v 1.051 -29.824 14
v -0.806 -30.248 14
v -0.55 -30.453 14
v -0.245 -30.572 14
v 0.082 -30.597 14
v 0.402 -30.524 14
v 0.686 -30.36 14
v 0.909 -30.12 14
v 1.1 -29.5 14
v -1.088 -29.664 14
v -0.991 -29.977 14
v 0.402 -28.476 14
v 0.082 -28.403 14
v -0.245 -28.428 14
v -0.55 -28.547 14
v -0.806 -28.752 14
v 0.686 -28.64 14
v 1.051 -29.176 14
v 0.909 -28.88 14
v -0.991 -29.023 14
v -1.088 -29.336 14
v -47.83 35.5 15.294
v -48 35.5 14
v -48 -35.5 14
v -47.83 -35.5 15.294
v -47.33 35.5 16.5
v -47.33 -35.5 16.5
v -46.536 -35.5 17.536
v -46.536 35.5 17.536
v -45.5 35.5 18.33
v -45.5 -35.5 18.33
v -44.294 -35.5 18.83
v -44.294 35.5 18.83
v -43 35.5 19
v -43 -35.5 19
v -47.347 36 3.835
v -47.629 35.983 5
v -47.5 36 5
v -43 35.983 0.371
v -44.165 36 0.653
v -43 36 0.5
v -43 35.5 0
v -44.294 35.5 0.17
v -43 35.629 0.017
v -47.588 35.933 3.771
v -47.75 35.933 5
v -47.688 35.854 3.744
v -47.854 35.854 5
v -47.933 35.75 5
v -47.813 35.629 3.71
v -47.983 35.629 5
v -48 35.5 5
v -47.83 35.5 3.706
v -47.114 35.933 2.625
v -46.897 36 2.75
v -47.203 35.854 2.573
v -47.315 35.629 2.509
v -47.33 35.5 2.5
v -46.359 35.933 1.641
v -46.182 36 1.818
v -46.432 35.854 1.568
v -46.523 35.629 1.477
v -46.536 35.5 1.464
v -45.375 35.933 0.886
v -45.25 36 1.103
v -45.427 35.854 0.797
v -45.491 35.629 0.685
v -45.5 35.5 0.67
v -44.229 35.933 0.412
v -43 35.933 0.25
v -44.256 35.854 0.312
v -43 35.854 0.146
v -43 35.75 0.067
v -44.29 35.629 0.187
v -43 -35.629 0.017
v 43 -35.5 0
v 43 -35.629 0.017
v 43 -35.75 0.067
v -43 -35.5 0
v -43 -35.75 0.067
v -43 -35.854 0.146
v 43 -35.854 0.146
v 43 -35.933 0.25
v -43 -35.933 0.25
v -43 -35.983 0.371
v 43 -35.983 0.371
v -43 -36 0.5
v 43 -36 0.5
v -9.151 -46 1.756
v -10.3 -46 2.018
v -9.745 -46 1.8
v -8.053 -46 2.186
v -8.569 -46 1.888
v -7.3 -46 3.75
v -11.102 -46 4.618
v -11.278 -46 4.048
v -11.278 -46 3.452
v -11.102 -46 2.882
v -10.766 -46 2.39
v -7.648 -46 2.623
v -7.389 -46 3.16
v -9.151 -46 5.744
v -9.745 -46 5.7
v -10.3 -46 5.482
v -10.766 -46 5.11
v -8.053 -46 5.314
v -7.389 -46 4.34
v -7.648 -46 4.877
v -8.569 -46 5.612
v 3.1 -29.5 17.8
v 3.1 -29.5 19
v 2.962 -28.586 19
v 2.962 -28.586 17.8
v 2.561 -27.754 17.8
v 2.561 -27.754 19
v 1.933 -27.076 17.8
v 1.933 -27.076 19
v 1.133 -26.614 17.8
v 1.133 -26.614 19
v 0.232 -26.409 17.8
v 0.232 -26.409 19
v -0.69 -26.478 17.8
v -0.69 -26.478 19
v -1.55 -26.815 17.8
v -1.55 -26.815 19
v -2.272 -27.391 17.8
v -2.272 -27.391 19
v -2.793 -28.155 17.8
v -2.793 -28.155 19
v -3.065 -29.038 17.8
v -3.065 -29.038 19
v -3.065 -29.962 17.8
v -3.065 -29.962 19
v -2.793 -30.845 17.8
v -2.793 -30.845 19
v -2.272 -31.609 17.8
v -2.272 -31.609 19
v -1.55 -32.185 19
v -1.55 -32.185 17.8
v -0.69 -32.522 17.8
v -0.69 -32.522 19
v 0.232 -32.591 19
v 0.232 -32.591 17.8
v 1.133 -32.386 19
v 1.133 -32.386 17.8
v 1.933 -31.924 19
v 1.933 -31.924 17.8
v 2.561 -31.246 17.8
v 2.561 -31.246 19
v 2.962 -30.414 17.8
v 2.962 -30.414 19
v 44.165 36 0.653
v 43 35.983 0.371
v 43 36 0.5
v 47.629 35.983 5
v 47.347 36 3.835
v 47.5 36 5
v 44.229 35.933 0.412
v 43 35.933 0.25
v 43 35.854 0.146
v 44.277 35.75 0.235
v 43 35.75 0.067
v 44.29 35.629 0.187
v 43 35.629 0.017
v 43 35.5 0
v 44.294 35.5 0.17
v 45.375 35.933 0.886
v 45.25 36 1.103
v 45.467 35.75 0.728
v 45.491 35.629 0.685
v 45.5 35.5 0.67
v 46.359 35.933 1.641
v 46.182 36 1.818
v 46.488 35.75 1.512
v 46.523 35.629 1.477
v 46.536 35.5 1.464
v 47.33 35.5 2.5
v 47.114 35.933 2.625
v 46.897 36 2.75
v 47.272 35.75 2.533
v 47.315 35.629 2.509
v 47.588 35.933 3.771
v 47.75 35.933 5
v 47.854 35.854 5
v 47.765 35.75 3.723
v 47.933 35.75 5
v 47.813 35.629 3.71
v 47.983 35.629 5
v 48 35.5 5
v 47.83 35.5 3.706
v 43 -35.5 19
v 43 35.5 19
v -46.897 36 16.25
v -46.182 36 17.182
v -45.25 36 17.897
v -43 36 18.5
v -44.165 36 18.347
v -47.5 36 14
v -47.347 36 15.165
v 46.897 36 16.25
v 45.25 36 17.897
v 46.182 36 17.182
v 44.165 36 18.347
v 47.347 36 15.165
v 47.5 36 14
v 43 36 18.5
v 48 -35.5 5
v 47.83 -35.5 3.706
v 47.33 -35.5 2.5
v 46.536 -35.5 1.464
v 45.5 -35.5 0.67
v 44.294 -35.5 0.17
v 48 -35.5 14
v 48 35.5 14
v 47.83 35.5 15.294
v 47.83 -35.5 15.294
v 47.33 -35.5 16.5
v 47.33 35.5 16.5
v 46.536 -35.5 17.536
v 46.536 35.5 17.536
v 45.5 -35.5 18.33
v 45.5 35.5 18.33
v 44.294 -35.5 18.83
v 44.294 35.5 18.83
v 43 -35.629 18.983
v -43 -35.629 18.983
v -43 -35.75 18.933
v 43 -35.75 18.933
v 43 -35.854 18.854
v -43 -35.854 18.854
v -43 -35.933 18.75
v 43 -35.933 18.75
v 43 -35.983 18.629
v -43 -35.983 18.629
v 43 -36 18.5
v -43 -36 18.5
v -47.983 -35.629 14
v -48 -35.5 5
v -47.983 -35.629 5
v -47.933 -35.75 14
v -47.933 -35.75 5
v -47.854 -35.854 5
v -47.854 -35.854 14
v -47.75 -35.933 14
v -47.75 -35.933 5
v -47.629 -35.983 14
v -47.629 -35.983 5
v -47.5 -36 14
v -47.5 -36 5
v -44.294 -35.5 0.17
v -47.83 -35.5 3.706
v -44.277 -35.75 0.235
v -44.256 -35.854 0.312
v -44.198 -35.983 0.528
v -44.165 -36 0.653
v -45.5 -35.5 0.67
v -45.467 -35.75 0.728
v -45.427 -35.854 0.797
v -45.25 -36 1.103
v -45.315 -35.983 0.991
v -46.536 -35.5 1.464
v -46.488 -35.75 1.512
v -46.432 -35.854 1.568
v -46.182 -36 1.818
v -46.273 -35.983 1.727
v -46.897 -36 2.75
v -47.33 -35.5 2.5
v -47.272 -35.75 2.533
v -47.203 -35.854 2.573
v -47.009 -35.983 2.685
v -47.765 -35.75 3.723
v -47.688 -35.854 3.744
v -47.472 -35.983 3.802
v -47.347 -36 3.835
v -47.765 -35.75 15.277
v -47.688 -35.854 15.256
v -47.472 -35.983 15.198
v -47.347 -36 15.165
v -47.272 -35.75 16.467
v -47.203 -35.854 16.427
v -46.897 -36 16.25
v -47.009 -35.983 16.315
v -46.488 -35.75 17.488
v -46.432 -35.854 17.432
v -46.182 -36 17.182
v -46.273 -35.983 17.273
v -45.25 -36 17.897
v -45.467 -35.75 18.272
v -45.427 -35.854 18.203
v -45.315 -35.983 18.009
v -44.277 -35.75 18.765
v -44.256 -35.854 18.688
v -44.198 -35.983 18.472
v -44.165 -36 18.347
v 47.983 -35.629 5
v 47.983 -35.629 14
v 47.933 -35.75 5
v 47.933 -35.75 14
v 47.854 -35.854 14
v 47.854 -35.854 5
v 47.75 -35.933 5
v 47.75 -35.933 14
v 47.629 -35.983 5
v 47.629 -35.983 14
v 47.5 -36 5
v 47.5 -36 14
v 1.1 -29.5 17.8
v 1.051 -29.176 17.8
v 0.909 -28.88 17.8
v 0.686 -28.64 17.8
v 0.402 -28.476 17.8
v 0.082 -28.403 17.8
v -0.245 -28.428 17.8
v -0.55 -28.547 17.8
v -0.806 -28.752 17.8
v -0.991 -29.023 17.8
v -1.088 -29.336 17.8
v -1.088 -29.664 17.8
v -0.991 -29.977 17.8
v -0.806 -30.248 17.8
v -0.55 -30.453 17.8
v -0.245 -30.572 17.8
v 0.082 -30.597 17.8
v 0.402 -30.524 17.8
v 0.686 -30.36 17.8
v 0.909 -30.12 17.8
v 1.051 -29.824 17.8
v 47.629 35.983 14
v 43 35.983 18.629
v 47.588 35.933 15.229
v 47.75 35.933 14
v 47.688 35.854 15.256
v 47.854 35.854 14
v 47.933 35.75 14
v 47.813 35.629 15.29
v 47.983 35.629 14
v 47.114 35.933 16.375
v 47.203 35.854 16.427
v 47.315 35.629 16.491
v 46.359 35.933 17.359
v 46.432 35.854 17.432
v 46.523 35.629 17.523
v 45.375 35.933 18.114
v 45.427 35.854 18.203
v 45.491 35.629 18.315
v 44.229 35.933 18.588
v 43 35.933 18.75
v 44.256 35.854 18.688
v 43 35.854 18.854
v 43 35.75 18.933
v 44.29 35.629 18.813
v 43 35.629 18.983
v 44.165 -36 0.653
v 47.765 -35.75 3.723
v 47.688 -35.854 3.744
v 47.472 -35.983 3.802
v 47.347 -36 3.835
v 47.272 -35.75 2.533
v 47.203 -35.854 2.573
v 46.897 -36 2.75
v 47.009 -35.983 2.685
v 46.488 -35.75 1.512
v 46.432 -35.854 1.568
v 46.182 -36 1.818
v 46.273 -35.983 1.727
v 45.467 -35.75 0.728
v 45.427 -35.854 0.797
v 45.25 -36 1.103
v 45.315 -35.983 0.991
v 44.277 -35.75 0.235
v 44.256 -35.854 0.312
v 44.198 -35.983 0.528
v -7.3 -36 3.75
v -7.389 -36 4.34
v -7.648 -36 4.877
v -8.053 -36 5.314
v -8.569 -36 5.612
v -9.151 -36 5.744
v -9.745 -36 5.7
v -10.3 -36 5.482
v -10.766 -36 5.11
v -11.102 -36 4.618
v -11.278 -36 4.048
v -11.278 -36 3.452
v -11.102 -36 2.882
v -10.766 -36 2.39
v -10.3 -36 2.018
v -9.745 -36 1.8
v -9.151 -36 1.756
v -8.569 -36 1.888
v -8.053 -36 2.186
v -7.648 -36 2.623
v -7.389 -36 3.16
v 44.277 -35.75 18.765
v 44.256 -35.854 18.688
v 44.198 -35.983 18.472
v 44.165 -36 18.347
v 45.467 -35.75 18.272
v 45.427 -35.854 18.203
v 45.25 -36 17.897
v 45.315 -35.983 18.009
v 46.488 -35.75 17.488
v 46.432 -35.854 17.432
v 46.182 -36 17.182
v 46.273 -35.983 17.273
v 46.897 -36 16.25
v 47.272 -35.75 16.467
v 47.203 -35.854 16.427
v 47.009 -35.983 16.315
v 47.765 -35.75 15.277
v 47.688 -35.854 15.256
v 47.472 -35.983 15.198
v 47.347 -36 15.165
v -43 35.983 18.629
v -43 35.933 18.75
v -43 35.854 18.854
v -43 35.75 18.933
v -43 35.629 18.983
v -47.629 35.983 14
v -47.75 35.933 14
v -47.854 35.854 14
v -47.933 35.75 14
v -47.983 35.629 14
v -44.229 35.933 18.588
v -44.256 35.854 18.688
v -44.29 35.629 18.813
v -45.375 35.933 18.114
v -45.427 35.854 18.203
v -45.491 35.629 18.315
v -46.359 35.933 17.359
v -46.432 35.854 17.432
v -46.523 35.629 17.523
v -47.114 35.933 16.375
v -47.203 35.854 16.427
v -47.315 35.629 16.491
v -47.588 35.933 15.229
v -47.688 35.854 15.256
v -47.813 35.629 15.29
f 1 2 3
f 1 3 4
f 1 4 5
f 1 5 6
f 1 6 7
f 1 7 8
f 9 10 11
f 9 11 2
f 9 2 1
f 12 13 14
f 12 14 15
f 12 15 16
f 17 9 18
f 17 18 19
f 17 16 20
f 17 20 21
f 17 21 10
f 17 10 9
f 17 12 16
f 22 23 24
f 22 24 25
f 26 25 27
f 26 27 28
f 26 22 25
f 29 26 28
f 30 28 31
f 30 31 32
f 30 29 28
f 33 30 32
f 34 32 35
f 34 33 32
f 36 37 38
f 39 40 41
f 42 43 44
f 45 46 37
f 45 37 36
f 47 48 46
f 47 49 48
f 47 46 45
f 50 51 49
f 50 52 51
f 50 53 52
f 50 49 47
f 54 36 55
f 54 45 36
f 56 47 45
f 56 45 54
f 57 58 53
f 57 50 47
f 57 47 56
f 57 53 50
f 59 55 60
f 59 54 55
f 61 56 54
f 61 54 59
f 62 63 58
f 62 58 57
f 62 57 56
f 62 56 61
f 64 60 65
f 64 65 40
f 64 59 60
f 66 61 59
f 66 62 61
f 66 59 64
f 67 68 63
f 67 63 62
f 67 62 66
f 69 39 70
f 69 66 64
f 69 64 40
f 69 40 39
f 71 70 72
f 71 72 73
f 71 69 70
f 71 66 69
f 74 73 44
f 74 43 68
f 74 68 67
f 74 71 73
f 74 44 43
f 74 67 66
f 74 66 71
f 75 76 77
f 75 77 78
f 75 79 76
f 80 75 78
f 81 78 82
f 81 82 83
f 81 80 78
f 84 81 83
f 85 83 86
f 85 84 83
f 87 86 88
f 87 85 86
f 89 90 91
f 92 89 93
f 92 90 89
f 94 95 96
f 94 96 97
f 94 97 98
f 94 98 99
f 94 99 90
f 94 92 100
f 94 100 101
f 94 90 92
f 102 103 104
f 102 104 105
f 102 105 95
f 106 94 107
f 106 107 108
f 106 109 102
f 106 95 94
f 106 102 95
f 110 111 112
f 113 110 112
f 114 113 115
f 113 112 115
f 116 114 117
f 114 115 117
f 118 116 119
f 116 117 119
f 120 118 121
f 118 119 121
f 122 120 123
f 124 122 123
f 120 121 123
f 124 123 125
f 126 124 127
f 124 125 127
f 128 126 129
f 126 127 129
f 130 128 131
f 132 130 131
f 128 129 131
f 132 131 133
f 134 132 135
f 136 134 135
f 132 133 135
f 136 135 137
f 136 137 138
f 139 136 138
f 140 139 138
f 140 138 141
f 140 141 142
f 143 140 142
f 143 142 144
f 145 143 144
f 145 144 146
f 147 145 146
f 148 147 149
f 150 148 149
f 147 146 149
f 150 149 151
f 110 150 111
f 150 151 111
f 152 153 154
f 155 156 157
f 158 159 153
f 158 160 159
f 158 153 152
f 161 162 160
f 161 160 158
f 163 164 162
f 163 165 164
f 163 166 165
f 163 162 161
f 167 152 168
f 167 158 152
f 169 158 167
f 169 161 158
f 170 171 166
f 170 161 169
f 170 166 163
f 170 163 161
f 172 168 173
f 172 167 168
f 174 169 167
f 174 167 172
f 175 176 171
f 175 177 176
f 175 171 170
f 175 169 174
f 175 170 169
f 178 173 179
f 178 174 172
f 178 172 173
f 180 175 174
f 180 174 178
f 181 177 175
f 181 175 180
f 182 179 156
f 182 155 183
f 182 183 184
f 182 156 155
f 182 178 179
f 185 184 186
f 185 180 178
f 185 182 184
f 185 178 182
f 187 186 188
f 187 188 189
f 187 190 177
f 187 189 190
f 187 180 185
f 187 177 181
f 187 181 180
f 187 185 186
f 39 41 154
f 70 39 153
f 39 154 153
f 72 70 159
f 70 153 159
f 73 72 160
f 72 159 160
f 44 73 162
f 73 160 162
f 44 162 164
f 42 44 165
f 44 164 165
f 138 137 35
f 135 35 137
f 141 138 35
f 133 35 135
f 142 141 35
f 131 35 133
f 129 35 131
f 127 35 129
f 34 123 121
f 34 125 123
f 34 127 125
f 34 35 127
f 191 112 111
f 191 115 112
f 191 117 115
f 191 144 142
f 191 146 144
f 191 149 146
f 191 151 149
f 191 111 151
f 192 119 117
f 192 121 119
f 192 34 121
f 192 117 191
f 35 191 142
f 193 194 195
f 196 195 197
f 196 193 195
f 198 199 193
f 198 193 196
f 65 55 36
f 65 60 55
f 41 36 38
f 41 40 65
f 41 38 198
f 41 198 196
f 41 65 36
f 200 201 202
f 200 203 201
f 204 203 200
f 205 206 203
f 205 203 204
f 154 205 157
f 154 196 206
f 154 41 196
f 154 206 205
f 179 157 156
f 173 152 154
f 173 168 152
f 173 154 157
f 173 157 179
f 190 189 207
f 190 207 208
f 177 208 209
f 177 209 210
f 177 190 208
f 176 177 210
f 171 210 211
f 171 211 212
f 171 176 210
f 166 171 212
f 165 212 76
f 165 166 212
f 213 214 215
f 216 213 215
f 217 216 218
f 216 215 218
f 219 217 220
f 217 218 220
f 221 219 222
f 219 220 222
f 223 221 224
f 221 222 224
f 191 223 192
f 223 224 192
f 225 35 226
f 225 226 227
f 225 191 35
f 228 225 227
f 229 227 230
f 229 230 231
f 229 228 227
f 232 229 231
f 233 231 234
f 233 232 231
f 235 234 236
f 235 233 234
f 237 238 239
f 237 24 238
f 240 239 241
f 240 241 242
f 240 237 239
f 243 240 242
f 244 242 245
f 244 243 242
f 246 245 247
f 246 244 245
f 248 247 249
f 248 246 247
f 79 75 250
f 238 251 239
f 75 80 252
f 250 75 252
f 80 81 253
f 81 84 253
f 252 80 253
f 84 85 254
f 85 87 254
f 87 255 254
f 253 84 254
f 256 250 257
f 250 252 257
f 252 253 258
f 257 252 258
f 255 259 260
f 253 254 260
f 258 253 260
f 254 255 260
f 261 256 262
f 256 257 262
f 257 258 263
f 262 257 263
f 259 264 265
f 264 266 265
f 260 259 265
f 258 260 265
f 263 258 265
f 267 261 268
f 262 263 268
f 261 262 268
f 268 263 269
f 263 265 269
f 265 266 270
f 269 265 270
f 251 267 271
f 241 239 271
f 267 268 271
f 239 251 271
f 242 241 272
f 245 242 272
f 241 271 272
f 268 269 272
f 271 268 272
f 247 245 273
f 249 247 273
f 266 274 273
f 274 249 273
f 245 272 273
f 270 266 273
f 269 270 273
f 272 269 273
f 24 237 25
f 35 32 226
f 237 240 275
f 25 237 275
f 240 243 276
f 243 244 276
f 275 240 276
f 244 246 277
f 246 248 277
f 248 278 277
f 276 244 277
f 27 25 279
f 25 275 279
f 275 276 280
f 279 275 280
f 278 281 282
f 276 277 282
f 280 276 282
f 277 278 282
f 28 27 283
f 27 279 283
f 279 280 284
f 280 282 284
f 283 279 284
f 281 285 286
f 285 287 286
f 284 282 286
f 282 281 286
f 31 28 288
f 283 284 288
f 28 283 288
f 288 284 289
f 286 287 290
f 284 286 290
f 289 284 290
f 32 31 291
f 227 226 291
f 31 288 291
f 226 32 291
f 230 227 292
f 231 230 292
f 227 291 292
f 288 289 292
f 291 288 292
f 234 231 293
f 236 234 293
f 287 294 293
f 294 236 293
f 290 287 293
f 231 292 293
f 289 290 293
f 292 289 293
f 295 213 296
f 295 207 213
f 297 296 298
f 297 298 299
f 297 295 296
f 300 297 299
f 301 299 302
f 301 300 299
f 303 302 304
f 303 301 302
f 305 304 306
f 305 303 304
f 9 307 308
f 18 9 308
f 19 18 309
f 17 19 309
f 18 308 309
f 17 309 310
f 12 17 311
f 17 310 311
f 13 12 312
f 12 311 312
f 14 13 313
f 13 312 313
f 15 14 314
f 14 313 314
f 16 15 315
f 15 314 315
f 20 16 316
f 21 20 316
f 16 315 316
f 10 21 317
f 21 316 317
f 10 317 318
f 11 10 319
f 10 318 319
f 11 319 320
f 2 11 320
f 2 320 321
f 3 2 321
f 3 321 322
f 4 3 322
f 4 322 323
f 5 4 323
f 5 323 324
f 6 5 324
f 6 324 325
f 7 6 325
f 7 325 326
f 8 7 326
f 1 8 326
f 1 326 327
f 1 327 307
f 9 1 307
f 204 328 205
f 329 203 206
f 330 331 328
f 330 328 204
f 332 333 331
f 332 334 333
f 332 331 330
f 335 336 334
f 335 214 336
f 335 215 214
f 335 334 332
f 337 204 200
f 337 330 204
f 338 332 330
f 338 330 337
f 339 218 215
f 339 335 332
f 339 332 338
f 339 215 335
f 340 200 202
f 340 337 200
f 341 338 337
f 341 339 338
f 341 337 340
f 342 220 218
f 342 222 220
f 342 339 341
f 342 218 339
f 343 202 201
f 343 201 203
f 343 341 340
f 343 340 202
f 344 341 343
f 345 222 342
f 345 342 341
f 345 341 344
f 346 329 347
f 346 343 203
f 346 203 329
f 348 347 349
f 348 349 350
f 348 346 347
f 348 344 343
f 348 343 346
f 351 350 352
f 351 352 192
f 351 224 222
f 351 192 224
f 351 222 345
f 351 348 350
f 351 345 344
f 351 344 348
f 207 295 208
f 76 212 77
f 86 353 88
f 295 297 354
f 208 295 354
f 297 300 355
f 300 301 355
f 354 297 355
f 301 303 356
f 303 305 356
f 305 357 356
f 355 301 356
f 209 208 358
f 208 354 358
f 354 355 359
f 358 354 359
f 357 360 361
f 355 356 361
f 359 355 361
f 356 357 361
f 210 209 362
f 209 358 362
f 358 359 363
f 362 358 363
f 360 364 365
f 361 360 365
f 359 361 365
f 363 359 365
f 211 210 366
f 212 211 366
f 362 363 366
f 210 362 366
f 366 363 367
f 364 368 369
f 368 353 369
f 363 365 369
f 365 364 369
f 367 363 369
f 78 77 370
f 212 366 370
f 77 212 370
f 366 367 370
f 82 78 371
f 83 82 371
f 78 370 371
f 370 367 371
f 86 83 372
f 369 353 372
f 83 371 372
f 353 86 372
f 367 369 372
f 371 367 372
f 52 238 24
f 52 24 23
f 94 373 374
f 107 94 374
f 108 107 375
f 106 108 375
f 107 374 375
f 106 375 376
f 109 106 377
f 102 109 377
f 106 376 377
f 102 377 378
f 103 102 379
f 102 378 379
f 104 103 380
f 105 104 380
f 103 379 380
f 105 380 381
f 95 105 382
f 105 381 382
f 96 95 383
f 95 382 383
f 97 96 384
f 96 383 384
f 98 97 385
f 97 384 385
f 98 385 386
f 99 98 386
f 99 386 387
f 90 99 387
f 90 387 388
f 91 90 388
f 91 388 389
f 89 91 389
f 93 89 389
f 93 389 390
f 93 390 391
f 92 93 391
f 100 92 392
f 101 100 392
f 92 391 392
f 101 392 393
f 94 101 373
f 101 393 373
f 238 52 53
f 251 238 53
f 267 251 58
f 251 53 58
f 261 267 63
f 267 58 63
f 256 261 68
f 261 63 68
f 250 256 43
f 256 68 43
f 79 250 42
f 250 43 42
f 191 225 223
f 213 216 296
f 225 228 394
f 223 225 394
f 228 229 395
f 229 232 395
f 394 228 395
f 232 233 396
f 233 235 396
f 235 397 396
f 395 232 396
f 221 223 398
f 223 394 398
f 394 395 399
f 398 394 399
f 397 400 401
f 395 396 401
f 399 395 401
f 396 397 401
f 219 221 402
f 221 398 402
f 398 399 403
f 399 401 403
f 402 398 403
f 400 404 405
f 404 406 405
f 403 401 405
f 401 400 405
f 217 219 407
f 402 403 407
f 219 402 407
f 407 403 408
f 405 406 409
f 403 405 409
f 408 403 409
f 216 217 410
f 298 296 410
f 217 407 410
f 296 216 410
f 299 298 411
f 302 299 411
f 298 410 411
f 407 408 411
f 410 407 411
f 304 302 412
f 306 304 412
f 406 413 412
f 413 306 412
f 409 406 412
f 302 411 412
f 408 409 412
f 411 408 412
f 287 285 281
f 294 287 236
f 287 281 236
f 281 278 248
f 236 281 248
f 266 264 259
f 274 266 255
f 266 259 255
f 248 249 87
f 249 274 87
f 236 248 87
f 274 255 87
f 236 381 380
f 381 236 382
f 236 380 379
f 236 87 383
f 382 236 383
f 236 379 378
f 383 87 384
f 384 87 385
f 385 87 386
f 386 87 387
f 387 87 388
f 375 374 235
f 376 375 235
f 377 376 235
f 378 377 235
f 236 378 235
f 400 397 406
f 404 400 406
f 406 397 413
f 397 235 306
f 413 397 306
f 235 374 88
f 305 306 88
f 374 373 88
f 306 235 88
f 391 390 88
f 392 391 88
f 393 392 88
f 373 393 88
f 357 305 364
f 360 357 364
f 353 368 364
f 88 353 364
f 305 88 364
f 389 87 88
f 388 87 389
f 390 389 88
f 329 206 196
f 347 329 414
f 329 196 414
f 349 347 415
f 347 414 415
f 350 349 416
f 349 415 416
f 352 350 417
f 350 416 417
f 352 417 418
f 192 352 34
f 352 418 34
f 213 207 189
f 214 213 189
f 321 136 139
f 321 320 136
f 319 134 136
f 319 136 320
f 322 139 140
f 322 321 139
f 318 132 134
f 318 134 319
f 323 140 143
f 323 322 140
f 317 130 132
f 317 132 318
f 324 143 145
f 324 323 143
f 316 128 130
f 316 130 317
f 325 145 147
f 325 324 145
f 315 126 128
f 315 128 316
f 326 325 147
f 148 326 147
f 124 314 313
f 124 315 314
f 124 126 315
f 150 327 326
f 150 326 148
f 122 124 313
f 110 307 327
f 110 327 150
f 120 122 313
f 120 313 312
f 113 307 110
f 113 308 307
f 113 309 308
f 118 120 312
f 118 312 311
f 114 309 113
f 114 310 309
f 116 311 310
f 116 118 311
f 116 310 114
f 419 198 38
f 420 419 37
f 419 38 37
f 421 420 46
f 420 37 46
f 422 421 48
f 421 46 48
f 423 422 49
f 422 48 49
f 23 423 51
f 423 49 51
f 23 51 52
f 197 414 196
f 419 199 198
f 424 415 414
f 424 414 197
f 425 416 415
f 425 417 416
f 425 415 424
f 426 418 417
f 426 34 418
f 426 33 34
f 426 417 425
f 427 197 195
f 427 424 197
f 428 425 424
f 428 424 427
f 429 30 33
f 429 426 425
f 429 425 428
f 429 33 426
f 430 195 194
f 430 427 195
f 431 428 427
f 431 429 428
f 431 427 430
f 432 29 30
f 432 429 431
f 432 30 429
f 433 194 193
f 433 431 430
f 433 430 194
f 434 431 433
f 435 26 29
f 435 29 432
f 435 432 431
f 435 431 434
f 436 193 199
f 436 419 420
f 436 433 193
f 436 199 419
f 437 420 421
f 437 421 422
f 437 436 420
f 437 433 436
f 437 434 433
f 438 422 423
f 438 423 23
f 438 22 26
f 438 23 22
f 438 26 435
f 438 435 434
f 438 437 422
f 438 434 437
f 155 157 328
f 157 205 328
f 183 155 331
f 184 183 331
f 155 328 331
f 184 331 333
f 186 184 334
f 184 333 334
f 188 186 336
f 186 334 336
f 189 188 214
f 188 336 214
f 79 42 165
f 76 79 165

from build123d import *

# Parameters (mm, degrees)
F0_W     = 96
F0_H     = 72
F1_DEPTH = 19
F2_R     = 5
F3_R     = 0.5
F4_R     = 2
F5_DEPTH = 10
F6_R     = 1.1
F7_DEPTH = 5
F6_R_2   = 3.1
F8_DEPTH = 1.2


with BuildPart() as f1:
    # F0 (on Top) → F1 (new body)
    with BuildSketch(Plane.XY):
        Rectangle(F0_W, F0_H)
    extrude(amount=F1_DEPTH)

    # F2
    f2_edges = [f1.edges().sort_by_distance(p)[0] for p in [
        (48, 0, 19),
        (48, 0, 0),
        (-48, 0, 19),
        (-48, 0, 0),
    ]]
    fillet(f2_edges, radius=F2_R)

    # F3
    f3_edges = [f1.edges().sort_by_distance(p)[0] for p in [
        (-48, -36, 9.5),
        (-46.535534, -36, 1.464466),
        (-46.535534, -36, 17.535534),
        (0, -36, 0),
        (0, -36, 19),
        (46.535534, -36, 1.464466),
        (46.535534, -36, 17.535534),
        (48, -36, 9.5),
        (48, 36, 9.5),
        (46.535534, 36, 1.464466),
        (46.535534, 36, 17.535534),
        (0, 36, 0),
        (0, 36, 19),
        (-46.535534, 36, 1.464466),
        (-46.535534, 36, 17.535534),
        (-48, 36, 9.5),
    ]]
    fillet(f3_edges, radius=F3_R)

    # F4 (on face) → F5 (join)
    with BuildSketch(Plane.XZ.offset(36)):
        with Locations((-9.3, 3.75)):
            Circle(F4_R)
    extrude(amount=F5_DEPTH)

    # F6 (on face) → F7 (cut)
    with BuildSketch(Plane.XY.offset(19)):
        with Locations((0, -29.5)):
            Circle(F6_R)
    extrude(amount=-F7_DEPTH, mode=Mode.SUBTRACT)

    # F6 (on face) → F8 (cut)
    with BuildSketch(Plane.XY.offset(19)):
        with Locations((0, -29.5)):
            Circle(F6_R_2)
        with Locations((0, -29.5)):
            Circle(F6_R, mode=Mode.SUBTRACT)
    extrude(amount=-F8_DEPTH, mode=Mode.SUBTRACT)


solid = f1.part
